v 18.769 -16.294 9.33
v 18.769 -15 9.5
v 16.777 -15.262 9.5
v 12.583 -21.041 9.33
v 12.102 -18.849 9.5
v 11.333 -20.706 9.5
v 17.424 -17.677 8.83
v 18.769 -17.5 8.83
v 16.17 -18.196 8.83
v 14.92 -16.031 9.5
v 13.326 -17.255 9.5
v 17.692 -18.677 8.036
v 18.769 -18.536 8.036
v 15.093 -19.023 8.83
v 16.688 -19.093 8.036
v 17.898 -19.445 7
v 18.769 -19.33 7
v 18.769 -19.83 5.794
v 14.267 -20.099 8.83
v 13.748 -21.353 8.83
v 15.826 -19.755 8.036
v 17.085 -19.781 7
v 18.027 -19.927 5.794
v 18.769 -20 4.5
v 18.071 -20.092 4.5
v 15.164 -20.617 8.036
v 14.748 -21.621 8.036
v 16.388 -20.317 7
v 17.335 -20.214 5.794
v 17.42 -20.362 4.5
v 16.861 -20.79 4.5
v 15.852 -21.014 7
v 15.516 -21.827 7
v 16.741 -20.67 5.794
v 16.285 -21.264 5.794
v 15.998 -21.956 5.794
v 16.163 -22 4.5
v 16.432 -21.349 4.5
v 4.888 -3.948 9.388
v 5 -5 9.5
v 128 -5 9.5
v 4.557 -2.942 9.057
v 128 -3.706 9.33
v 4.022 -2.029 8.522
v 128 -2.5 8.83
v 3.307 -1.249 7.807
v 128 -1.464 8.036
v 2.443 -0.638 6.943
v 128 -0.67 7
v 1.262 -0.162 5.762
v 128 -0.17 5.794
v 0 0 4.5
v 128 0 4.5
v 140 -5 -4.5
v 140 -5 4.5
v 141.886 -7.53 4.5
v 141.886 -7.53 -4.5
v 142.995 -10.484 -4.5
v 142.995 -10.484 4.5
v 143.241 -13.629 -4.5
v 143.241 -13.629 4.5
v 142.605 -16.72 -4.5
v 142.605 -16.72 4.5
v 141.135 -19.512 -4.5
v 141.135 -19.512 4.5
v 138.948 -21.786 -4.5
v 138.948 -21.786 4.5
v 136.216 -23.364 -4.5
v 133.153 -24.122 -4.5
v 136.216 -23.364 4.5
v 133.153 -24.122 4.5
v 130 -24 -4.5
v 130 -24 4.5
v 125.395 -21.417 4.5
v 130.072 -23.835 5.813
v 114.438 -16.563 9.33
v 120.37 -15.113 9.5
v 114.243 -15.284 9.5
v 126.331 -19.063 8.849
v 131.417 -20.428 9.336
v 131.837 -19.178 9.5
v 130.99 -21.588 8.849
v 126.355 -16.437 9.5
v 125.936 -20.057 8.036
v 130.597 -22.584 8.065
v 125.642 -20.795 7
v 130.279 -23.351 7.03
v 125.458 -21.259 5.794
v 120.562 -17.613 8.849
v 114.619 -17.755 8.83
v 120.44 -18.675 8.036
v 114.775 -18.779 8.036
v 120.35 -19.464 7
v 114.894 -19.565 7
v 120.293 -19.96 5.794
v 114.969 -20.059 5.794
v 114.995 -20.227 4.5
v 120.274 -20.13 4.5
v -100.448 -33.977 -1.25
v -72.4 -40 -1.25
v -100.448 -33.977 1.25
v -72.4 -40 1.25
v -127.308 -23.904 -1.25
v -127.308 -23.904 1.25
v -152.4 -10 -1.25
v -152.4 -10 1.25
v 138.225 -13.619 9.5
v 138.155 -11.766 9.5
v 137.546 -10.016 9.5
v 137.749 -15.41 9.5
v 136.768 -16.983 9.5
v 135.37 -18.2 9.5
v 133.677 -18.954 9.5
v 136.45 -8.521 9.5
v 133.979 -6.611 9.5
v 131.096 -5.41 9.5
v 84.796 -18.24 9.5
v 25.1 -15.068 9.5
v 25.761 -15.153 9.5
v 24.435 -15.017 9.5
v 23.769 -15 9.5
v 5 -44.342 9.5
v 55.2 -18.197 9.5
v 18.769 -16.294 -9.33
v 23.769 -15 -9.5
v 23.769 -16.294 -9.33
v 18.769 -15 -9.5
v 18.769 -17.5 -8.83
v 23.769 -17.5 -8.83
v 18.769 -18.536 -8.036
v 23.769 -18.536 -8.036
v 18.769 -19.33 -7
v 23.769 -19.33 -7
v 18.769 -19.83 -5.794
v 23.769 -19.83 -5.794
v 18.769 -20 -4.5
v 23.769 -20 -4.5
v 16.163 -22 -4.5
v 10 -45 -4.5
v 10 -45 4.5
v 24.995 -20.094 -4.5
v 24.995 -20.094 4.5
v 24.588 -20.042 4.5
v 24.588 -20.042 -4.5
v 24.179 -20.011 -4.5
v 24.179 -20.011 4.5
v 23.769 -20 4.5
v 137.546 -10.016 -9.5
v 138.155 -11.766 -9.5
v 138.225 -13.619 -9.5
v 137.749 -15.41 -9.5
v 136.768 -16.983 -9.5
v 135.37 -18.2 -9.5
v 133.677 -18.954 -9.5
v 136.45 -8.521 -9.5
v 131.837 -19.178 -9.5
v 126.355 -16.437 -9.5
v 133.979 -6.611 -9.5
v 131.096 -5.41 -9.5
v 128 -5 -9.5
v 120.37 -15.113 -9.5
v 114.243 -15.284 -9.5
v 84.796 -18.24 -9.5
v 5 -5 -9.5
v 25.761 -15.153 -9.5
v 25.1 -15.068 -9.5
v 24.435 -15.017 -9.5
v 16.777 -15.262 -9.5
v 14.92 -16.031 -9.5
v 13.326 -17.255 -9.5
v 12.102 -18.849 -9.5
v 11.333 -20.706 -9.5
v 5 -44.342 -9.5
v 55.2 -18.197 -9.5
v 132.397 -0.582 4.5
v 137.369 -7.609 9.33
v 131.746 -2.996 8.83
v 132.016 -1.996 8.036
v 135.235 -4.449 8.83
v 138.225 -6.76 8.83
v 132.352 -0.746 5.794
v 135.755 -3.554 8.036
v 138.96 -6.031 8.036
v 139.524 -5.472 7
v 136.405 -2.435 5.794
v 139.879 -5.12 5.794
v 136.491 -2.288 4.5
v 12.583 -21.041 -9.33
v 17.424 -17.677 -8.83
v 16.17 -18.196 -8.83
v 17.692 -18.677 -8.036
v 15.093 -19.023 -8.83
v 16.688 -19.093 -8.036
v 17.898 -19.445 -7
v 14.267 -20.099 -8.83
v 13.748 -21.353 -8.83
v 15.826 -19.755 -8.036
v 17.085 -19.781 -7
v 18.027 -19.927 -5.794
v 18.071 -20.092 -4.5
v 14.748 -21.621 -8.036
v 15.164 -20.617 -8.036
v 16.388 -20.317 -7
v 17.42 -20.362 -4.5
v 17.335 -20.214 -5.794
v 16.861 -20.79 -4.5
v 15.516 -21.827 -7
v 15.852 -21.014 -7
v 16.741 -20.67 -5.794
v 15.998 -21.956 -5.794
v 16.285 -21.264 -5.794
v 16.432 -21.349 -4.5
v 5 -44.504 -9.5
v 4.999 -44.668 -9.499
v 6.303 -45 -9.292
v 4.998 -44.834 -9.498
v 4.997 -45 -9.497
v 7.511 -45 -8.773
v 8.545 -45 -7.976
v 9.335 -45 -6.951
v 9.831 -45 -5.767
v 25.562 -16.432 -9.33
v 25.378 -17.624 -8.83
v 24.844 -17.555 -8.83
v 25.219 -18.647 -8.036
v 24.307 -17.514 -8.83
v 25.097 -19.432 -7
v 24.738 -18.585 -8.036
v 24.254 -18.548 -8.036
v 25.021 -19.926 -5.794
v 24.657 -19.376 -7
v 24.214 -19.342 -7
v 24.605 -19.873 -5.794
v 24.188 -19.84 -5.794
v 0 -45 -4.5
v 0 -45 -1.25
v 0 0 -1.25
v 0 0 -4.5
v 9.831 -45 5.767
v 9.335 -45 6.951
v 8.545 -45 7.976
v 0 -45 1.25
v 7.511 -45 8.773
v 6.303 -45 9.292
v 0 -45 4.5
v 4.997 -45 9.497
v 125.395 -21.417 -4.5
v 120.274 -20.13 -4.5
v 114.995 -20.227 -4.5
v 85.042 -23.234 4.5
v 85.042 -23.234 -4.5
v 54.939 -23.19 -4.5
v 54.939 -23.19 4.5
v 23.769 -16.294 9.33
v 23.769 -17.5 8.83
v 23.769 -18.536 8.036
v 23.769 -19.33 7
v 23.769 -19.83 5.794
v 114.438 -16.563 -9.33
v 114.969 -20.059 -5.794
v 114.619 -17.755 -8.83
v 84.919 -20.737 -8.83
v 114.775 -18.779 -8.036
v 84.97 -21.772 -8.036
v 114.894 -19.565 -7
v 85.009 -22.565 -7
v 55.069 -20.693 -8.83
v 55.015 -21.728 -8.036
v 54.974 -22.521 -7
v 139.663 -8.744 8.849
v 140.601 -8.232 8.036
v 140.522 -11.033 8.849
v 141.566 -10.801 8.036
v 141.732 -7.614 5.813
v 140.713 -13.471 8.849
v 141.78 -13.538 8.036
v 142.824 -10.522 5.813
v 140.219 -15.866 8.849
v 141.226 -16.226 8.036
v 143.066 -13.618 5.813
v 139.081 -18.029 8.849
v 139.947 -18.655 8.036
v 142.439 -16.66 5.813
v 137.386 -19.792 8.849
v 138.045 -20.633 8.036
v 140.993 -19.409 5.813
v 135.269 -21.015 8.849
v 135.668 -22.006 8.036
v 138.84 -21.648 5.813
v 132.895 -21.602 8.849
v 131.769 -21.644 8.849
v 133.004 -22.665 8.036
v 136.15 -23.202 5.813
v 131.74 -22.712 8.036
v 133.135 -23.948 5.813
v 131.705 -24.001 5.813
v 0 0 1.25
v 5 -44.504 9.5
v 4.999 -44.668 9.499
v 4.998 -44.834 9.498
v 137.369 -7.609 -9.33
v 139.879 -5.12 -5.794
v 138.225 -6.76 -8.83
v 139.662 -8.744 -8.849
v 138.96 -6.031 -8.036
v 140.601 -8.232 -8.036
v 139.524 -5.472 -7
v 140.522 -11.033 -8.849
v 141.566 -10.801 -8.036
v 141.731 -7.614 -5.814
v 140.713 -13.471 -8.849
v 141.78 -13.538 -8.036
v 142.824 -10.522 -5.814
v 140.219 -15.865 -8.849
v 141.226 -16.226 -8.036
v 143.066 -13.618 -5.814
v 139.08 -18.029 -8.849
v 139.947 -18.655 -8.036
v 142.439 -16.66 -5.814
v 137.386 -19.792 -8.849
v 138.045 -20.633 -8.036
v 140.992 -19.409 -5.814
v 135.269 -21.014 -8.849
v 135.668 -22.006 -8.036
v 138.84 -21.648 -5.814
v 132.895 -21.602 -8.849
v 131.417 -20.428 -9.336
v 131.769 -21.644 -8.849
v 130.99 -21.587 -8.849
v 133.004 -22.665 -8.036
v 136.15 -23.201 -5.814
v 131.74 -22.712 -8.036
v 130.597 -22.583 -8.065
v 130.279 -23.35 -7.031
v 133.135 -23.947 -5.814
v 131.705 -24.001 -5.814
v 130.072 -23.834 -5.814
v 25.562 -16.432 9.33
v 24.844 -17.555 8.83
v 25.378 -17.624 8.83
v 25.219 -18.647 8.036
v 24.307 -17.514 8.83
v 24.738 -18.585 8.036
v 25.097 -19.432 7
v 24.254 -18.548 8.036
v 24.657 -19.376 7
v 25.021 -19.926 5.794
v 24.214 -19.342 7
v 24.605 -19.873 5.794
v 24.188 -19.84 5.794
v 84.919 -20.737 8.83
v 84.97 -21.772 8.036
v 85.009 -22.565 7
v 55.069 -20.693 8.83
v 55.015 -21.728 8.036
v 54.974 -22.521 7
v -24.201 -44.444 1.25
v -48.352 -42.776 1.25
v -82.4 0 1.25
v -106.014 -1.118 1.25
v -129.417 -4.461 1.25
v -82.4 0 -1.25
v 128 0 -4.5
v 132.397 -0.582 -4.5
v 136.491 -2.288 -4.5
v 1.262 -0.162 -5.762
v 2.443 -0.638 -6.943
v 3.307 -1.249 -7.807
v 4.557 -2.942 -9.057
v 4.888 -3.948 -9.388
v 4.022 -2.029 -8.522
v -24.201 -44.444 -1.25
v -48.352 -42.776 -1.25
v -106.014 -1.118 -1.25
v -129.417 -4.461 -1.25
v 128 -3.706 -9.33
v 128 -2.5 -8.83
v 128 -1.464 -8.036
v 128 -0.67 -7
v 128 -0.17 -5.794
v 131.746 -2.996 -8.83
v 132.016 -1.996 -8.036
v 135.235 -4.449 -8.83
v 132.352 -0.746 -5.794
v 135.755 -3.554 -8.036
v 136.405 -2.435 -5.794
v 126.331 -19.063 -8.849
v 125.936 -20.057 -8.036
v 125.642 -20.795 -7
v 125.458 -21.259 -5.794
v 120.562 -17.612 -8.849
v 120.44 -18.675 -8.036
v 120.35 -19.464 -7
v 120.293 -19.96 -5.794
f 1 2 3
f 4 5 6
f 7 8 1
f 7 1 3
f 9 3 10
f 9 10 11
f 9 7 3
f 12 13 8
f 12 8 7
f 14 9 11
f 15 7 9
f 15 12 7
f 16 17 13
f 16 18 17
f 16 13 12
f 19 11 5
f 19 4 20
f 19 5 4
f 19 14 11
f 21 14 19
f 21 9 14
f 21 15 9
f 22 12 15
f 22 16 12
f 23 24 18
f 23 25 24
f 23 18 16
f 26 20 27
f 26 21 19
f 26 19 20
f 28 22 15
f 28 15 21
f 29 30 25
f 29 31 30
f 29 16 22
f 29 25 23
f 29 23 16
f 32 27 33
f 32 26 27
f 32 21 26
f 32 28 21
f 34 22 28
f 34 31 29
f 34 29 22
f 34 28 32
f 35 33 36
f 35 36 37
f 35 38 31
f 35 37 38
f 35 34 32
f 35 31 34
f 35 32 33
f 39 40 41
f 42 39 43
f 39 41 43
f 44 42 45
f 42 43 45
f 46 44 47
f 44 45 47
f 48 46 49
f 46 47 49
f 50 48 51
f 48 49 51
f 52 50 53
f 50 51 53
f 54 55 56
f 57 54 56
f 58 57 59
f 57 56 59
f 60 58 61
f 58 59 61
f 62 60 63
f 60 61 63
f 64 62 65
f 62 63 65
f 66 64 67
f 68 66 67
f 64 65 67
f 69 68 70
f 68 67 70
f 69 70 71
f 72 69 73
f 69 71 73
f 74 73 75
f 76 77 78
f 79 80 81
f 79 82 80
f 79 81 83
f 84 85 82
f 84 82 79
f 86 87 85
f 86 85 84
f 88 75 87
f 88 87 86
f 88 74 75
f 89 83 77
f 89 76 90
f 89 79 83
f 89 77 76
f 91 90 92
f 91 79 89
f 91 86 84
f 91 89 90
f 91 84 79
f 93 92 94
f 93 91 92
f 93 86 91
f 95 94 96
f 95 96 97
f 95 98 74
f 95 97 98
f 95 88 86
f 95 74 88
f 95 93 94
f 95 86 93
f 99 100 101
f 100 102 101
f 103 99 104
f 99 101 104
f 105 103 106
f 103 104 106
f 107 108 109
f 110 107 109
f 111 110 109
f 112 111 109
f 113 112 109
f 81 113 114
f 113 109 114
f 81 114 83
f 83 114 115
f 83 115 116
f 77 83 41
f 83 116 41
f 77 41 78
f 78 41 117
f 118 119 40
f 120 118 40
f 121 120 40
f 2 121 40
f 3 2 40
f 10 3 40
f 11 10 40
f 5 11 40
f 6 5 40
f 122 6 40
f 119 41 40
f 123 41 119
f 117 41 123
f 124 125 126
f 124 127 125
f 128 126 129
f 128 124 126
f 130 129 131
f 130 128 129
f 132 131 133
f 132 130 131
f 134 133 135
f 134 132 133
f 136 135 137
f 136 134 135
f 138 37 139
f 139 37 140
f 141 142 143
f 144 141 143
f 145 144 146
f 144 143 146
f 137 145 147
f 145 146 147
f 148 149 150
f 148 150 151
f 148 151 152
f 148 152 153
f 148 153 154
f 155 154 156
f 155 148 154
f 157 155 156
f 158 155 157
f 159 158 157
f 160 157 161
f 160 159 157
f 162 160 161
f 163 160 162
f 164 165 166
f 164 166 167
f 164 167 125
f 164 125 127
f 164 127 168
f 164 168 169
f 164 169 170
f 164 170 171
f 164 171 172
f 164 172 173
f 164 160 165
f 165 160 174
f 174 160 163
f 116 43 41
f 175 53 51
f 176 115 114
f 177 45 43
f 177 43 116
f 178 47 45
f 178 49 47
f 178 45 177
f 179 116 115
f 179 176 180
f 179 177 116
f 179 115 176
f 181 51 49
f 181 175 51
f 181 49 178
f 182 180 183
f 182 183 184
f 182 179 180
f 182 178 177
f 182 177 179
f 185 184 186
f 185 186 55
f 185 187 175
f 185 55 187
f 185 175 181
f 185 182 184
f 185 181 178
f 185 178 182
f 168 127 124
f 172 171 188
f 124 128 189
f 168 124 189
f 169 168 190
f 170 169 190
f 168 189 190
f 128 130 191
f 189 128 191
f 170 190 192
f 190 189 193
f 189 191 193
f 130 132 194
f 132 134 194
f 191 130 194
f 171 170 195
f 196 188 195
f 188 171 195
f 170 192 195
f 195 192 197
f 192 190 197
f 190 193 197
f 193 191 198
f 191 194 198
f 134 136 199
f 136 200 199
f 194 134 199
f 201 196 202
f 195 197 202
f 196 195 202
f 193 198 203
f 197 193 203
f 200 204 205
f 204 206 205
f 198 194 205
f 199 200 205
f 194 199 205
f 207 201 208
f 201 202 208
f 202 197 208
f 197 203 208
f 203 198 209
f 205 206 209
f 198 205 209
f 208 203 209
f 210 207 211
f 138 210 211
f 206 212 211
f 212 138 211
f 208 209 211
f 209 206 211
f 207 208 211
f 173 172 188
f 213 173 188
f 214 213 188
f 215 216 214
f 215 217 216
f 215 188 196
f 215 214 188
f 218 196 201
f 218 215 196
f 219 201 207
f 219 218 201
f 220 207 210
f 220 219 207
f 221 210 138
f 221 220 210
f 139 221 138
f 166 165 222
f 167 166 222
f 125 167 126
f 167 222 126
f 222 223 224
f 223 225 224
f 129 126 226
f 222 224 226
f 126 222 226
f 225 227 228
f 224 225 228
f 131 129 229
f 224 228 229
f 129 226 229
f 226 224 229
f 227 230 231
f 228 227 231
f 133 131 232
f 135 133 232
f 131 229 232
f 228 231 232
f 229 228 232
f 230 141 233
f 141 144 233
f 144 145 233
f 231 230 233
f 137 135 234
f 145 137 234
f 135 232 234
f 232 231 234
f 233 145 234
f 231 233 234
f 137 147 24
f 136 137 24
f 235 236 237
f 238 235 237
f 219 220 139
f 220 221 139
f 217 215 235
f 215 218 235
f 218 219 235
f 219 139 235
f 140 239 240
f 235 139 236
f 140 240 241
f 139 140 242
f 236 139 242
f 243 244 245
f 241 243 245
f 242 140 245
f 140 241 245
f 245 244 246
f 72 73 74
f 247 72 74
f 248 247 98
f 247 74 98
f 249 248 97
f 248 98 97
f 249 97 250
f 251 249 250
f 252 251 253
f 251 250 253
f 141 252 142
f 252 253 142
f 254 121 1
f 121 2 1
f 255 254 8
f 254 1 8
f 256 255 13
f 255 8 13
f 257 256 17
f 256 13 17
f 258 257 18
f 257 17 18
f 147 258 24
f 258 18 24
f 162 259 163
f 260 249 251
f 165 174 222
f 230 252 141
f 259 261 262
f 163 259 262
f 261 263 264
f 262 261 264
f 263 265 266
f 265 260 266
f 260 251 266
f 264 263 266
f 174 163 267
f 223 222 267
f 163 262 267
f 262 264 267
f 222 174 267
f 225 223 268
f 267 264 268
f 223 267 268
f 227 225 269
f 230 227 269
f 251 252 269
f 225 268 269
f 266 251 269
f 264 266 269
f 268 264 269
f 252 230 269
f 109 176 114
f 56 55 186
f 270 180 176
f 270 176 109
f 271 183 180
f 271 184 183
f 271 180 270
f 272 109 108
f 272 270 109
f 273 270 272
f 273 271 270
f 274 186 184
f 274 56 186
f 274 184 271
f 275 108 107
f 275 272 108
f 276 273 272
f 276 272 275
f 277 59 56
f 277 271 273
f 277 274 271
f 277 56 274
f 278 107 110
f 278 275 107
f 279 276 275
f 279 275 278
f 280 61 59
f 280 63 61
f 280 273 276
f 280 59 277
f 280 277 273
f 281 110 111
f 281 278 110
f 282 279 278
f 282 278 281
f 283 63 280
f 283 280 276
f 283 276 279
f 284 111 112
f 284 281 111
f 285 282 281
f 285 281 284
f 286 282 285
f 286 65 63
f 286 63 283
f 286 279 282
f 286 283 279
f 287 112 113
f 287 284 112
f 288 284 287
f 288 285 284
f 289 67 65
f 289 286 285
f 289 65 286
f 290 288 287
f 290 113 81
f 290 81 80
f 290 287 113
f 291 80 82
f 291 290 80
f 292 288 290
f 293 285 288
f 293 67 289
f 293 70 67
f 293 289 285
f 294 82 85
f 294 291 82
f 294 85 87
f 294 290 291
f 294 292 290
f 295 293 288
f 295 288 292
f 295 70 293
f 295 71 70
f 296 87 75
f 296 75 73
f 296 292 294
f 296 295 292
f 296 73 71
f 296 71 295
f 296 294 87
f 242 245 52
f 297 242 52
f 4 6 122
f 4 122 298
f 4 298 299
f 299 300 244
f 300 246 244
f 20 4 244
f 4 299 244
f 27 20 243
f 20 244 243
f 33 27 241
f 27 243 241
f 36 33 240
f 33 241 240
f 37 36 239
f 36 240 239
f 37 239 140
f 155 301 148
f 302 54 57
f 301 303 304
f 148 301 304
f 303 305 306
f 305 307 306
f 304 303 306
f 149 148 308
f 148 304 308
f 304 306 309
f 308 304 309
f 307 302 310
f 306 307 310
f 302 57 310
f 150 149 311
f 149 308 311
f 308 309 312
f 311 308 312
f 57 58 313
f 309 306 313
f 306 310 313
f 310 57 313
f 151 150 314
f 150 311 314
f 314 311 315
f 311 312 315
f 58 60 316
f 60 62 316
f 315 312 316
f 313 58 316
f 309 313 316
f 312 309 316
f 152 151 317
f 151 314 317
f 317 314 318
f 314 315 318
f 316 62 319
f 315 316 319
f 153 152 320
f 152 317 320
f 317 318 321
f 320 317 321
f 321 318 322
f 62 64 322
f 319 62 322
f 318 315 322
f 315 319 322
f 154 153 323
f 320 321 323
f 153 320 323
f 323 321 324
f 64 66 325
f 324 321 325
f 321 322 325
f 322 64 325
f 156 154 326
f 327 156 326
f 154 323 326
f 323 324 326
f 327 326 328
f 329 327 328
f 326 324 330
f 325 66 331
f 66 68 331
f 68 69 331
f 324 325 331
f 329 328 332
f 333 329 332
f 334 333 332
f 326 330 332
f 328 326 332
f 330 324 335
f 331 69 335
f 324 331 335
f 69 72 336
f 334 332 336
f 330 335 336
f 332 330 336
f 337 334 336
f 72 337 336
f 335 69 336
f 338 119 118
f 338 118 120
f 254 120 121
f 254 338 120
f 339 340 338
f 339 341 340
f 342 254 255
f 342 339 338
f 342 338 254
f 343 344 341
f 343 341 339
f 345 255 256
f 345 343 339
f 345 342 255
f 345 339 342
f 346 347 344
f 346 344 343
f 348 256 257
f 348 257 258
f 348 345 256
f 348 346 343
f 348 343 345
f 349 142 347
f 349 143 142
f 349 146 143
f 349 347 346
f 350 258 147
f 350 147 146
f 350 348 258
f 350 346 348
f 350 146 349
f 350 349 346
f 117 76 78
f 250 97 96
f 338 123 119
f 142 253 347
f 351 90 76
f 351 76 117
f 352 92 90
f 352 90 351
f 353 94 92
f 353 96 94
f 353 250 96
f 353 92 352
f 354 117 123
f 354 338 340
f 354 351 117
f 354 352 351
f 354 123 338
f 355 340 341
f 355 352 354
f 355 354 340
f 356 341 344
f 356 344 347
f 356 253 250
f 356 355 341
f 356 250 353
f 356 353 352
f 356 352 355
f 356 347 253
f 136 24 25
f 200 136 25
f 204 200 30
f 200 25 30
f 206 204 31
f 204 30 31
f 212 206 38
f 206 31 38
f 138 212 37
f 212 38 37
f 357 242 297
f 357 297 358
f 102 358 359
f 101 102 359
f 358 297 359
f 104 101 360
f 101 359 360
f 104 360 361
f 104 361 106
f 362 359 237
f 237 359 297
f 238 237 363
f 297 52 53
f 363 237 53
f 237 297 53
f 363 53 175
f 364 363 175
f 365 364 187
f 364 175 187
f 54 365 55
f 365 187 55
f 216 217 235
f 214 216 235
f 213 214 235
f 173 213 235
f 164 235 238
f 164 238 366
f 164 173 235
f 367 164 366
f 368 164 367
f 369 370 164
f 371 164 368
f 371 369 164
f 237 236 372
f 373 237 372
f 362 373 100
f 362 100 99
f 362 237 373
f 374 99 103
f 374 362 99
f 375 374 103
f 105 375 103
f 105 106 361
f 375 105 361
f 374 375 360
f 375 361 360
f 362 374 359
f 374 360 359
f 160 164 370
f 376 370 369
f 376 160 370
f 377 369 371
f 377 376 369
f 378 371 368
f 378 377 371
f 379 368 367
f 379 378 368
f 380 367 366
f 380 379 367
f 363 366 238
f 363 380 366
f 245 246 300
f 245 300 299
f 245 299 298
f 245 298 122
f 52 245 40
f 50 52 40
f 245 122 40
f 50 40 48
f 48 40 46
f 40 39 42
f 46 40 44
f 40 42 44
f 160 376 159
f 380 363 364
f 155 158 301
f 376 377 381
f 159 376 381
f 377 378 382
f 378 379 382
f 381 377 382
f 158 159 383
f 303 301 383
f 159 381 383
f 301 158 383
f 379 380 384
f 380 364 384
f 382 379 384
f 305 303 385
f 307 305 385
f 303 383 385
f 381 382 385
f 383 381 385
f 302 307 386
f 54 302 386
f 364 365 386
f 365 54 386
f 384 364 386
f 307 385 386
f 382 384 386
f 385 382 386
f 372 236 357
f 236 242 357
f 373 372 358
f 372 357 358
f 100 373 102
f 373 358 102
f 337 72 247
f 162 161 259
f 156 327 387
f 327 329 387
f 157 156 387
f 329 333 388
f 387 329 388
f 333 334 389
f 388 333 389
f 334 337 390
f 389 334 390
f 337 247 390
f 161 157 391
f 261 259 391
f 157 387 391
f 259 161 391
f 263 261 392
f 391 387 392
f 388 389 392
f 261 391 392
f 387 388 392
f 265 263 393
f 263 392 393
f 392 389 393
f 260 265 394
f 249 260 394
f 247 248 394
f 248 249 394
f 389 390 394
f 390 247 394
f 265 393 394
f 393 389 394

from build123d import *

# Parameters (mm, degrees)
BOSS_EXTRUDE1_DEPTH = 1.25
BOSS_EXTRUDE2_DEPTH = 9.5
CHAMFER1_SIZE       = 5
FILLET1_R           = 5


with BuildPart() as part:
    # Sketch1 → Boss-Extrude1 (new, symmetric)
    with BuildSketch(Plane.XY):
        with BuildLine():
            Line((0, 0), (0, -45))
            ThreePointArc((0, -45), (-36.286223281, -43.748513109), (-72.4, -40))
            ThreePointArc((-72.4, -40), (-114.06327772, -29.435407254), (-152.4, -10))
            ThreePointArc((-152.4, -10), (-117.755339059, -2.512626585), (-82.4, 0))
            Line((-82.4, 0), (0, 0))
        make_face()
    extrude(amount=BOSS_EXTRUDE1_DEPTH, both=True)

    # Sketch2 → Boss-Extrude2 (add, symmetric)
    with BuildSketch(Plane.XY):
        with BuildLine():
            Line((0, 0), (128, 0))
            ThreePointArc((128, 0), (134.5, -1.3), (140, -5))
            ThreePointArc((140, -5), (141.968086361, -18.167413874), (130, -24))
            ThreePointArc((130, -24), (122.876979683, -20.60373569), (114.994710808, -20.227083248))
            ThreePointArc((114.994710808, -20.227083248), (69.989649226, -23.594360459), (24.994710808, -20.094411808))
            ThreePointArc((24.994710808, -20.094411808), (24.383812263, -20.023637874), (23.769282172, -20))
            Line((23.769282172, -20), (18.769282172, -20))
            ThreePointArc((18.769282172, -20), (17.12660254, -20.557614597), (16.162831426, -22))
            Line((16.162831426, -22), (10, -45))
            Line((10, -45), (0, -45))
            Line((0, -45), (0, 0))
        make_face()
    extrude(amount=BOSS_EXTRUDE2_DEPTH, both=True)

    # Chamfer1
    chamfer1_edges = [part.edges().sort_by_distance(p)[0] for p in [
        (0, -22.5, -9.5),
        (0, -22.5, 9.5),
    ]]
    chamfer(chamfer1_edges, length=CHAMFER1_SIZE)

    # Fillet1
    fillet1_edges = [part.edges().sort_by_distance(p)[0] for p in [
        (13.081415713, -33.5, -9.5),
        (17.12660254, -20.557614597, -9.5),
        (21.269282172, -20, -9.5),
        (24.383812263, -20.023637874, -9.5),
        (122.876979683, -20.60373569, -9.5),
        (141.968086361, -18.167413874, -9.5),
        (134.5, -1.3, -9.5),
        (13.081415713, -33.5, 9.5),
        (17.12660254, -20.557614597, 9.5),
        (21.269282172, -20, 9.5),
        (24.383812263, -20.023637874, 9.5),
        (122.876979683, -20.60373569, 9.5),
        (141.968086361, -18.167413874, 9.5),
        (134.5, -1.3, 9.5),
        (69.989649226, -23.594360459, -9.5),
        (66.5, 0, -9.5),
        (69.989649226, -23.594360459, 9.5),
        (66.5, 0, 9.5),
    ]]
    fillet(fillet1_edges, radius=FILLET1_R)


solid = part.part
